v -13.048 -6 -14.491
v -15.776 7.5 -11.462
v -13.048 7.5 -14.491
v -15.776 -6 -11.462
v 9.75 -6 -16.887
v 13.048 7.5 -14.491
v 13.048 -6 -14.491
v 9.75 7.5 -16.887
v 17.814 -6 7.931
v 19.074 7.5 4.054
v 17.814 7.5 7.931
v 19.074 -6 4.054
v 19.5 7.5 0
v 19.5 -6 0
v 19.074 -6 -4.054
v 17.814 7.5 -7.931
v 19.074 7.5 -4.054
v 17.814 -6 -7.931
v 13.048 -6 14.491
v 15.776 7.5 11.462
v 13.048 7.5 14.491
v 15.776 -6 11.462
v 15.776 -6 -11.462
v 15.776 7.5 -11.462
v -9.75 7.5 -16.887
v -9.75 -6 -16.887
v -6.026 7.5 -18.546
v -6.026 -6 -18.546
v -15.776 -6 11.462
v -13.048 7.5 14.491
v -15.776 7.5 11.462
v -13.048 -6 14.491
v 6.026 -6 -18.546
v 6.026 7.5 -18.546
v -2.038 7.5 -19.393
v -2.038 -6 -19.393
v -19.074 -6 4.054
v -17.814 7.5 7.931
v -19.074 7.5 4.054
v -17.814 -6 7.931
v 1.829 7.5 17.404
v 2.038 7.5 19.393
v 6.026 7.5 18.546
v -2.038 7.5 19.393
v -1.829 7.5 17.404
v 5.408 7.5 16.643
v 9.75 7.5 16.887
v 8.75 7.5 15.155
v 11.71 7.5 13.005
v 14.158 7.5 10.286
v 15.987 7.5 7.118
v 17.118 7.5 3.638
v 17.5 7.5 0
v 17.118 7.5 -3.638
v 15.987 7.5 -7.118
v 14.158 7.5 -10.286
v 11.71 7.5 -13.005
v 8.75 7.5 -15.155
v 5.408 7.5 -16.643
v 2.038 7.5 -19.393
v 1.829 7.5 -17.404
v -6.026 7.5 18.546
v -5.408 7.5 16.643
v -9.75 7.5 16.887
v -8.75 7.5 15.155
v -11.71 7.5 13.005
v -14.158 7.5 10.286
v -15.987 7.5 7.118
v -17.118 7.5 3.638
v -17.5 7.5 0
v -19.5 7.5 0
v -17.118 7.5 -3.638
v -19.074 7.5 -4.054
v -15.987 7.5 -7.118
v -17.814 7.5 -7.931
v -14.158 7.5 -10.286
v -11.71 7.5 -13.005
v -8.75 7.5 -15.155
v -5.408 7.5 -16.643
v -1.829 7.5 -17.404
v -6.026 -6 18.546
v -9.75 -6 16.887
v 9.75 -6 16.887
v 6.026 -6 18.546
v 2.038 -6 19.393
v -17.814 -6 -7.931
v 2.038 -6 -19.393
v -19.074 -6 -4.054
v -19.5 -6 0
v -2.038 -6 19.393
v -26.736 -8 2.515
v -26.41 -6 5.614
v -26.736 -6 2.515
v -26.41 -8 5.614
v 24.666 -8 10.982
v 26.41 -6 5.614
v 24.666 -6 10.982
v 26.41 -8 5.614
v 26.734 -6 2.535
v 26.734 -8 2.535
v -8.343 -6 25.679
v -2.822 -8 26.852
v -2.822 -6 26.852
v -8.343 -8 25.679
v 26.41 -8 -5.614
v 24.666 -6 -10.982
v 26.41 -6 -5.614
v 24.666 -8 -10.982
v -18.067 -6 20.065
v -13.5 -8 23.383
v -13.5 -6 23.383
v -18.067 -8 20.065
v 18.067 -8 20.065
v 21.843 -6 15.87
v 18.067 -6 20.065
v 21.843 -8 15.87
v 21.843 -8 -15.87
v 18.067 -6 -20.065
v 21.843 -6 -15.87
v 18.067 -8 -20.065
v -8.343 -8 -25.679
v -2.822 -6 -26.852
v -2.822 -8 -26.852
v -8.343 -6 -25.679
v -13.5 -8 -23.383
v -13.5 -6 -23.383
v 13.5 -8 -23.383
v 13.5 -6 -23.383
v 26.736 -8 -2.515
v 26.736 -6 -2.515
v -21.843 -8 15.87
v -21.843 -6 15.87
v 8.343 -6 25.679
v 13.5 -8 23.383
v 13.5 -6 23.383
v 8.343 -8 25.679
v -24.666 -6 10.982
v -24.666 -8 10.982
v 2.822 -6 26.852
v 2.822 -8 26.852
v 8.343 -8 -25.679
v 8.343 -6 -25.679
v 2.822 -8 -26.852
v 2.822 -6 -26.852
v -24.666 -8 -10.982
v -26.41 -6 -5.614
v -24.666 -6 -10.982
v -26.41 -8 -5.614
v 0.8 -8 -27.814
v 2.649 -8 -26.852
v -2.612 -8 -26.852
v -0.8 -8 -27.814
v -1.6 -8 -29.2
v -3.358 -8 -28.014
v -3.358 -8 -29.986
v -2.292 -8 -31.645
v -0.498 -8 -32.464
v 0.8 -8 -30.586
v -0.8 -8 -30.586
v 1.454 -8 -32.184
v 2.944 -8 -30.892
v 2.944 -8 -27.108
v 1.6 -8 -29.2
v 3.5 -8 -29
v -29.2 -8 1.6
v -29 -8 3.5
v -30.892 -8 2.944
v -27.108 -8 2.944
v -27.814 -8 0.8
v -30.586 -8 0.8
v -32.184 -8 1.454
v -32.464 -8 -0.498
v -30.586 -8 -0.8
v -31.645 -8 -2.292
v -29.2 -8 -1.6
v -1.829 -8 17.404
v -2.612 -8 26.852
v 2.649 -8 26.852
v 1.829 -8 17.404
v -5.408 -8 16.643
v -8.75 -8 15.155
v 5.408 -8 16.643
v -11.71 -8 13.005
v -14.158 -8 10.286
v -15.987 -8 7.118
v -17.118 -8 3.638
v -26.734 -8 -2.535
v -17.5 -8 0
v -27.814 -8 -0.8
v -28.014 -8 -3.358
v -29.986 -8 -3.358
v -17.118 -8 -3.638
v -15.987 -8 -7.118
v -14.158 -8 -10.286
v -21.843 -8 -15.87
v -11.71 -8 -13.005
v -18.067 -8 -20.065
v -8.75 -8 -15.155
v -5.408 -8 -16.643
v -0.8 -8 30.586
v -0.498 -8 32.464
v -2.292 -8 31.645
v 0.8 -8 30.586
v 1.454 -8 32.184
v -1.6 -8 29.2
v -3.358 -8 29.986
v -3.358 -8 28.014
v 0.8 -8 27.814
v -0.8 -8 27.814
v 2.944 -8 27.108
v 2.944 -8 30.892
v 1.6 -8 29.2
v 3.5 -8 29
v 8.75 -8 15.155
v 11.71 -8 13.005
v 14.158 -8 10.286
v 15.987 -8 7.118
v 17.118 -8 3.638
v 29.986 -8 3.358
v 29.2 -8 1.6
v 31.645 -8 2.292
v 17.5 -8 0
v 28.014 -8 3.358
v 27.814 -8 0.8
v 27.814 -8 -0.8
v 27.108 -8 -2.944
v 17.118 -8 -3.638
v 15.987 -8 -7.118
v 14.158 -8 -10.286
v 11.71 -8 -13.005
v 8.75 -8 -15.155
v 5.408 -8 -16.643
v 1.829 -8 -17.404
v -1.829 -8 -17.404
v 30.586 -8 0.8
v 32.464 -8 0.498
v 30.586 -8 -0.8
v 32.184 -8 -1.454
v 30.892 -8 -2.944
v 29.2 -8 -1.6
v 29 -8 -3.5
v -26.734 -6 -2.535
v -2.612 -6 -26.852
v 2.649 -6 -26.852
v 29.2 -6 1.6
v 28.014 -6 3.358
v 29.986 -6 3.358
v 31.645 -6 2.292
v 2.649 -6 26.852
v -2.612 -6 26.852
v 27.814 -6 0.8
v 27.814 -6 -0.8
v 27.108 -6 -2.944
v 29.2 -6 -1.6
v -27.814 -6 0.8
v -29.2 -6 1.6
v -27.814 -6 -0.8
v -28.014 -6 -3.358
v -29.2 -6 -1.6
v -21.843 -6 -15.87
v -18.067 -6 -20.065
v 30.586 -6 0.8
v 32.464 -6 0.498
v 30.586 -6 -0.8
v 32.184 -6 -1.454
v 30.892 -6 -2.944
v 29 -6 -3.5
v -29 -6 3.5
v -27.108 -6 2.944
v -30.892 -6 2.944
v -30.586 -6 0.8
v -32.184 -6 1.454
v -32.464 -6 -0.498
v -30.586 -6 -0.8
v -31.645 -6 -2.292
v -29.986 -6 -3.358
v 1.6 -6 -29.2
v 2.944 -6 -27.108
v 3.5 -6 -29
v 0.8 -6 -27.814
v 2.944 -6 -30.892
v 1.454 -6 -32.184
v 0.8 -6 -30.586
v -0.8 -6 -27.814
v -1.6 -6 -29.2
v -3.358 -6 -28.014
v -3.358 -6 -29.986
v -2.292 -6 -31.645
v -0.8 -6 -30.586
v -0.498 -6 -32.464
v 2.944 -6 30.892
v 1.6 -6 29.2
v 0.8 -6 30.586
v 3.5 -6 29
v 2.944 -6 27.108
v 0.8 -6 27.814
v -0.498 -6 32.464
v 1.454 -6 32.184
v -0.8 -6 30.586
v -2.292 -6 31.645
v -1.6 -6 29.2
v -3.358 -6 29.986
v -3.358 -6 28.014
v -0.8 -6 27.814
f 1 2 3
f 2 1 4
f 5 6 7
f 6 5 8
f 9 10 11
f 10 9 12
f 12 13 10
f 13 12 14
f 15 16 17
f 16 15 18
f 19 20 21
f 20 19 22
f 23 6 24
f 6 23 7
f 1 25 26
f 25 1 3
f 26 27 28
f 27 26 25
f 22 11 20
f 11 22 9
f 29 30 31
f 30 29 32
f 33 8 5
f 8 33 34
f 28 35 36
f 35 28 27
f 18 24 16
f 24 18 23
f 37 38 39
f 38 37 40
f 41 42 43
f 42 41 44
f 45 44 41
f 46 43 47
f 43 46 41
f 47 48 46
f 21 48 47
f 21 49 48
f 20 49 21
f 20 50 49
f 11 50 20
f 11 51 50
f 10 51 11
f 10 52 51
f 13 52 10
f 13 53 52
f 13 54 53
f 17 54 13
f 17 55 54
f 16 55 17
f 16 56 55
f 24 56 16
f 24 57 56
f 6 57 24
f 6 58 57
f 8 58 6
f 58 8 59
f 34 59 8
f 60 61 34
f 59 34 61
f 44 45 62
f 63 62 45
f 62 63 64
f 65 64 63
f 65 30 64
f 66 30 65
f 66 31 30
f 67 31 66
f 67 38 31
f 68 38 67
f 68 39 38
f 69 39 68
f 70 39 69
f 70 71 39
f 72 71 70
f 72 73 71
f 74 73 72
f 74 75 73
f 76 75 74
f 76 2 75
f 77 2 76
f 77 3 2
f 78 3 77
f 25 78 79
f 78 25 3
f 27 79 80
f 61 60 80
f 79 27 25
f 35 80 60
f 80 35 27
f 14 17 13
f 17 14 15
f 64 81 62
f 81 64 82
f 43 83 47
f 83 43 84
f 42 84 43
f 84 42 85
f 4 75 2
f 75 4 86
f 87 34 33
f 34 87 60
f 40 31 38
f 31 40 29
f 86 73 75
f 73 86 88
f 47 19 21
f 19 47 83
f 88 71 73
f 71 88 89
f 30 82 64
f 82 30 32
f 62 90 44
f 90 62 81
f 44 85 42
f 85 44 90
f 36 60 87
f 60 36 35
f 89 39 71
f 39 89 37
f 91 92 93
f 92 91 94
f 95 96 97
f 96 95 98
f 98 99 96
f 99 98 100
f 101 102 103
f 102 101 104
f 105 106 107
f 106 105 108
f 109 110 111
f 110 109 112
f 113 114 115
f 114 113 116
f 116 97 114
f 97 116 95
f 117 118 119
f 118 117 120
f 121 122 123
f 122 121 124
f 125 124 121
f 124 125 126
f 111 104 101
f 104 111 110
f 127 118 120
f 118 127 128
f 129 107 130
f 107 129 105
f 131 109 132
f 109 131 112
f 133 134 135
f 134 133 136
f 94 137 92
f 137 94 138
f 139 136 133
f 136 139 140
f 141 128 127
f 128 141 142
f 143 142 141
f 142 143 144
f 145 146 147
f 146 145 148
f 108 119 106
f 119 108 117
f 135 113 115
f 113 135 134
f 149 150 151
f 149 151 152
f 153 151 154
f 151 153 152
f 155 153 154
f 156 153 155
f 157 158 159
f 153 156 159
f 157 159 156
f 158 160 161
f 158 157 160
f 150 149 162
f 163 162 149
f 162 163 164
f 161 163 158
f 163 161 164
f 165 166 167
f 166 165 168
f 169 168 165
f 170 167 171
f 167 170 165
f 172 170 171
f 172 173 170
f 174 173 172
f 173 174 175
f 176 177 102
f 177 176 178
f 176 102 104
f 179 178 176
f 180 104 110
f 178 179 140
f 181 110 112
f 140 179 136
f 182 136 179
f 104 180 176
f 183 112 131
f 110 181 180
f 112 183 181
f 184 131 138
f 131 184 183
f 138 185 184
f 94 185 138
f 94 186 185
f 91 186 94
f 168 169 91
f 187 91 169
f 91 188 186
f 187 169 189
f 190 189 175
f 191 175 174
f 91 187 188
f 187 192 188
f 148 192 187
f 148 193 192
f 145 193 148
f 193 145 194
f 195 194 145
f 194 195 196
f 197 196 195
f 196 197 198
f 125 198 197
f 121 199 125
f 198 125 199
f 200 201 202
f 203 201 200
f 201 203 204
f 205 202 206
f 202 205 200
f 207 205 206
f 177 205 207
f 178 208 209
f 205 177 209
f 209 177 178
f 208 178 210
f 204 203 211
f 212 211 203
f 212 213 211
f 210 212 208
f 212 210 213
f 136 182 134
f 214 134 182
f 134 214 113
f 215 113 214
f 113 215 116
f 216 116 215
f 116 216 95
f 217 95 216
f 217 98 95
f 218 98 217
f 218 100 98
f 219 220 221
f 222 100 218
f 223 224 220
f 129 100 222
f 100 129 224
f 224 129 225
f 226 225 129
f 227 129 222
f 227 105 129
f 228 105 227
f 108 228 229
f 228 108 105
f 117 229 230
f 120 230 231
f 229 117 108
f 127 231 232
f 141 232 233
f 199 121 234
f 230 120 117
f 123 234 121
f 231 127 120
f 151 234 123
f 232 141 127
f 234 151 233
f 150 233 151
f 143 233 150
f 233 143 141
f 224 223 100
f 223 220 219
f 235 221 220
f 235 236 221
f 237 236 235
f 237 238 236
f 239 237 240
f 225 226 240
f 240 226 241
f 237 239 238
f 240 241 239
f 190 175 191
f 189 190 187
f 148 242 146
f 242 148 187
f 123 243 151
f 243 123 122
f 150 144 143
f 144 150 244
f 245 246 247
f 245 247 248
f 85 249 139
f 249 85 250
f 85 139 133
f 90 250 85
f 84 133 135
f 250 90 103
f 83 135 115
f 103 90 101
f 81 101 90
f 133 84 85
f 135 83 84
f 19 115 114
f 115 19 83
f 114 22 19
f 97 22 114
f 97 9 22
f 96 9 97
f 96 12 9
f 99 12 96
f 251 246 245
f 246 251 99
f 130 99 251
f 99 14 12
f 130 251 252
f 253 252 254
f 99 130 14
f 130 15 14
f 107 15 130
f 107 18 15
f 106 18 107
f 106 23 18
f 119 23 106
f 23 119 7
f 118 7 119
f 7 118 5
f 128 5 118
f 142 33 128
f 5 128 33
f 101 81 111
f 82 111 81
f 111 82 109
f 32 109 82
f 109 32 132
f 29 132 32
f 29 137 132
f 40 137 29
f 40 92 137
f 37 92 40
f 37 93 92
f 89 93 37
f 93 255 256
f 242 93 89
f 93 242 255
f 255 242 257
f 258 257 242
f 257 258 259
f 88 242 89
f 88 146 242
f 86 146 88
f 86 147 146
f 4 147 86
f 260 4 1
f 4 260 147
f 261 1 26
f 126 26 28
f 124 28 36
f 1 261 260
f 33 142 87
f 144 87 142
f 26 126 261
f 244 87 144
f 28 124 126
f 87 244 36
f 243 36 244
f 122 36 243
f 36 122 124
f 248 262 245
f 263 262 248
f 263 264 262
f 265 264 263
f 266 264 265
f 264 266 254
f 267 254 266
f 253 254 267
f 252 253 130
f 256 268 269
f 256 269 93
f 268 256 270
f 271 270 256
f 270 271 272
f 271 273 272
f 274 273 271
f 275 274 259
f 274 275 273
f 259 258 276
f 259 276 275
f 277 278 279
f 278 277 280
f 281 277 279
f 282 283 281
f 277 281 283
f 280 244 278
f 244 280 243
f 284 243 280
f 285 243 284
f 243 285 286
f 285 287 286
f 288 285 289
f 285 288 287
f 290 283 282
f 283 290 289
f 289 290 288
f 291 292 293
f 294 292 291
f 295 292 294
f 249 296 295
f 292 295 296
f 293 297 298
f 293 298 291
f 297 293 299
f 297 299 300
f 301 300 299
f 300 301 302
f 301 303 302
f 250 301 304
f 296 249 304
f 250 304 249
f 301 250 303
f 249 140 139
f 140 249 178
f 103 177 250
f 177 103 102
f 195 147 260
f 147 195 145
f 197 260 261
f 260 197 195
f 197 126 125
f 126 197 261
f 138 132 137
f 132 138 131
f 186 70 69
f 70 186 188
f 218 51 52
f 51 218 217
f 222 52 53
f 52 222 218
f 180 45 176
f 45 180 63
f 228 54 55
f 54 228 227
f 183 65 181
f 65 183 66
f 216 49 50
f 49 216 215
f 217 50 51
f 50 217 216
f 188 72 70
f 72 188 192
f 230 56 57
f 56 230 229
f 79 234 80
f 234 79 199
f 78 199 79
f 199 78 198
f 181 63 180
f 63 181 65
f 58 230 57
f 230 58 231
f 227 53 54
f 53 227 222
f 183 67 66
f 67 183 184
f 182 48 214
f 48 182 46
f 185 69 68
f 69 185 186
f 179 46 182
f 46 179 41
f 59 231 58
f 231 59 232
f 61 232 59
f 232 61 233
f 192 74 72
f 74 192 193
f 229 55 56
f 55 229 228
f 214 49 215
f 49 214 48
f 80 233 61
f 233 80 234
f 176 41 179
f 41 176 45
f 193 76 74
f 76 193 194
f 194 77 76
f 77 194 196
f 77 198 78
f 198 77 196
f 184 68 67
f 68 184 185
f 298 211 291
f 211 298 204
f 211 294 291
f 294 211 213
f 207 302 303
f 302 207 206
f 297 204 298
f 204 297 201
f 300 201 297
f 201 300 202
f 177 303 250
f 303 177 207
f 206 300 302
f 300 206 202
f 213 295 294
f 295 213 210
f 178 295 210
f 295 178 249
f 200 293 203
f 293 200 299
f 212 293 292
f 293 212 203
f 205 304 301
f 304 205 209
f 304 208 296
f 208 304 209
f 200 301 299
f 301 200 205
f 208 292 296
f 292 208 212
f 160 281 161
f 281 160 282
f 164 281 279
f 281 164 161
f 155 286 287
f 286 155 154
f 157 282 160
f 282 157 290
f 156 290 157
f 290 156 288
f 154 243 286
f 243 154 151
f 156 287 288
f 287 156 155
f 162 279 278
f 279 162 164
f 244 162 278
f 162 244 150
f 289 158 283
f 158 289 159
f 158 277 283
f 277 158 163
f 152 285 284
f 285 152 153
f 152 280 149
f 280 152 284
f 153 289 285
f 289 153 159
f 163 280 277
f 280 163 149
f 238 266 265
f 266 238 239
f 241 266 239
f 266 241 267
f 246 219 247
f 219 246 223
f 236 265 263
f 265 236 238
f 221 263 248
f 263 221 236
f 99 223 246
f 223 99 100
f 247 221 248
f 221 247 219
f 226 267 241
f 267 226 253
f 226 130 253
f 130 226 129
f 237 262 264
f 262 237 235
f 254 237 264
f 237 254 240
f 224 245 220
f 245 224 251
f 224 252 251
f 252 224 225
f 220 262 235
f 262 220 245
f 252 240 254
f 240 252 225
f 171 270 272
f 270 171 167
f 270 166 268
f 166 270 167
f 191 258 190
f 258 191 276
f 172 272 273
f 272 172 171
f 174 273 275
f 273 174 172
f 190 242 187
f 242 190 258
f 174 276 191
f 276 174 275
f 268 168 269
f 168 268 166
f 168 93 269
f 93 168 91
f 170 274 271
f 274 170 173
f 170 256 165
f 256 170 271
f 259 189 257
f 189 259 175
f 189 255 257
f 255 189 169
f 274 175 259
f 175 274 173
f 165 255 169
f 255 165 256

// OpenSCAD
difference(){
    union(){
    rotate([90,0,0])
    cylinder(h=15,r=19.5,center=true);
    rotate([90,0,0])
    translate([0,0,7])
    cylinder(h=2,r=27,center=true);};
            
    rotate([90,0,0])
    translate([0,0,0])
    cylinder(h=19,r=17.5,center=true);}
    
module screw_hole(){
    difference(){
    rotate([90,0,0])
    translate([0,29,6])
        cylinder(h=2,d=7);
    rotate([90,0,0])
    translate([0,29.2,6])
        cylinder(h=2,d=3.2);}}
        
screw_hole();
mirror([0,0,1])screw_hole();
        
rotate([0,90,0])
screw_hole();
rotate([0,-90,0])
screw_hole();  
    
